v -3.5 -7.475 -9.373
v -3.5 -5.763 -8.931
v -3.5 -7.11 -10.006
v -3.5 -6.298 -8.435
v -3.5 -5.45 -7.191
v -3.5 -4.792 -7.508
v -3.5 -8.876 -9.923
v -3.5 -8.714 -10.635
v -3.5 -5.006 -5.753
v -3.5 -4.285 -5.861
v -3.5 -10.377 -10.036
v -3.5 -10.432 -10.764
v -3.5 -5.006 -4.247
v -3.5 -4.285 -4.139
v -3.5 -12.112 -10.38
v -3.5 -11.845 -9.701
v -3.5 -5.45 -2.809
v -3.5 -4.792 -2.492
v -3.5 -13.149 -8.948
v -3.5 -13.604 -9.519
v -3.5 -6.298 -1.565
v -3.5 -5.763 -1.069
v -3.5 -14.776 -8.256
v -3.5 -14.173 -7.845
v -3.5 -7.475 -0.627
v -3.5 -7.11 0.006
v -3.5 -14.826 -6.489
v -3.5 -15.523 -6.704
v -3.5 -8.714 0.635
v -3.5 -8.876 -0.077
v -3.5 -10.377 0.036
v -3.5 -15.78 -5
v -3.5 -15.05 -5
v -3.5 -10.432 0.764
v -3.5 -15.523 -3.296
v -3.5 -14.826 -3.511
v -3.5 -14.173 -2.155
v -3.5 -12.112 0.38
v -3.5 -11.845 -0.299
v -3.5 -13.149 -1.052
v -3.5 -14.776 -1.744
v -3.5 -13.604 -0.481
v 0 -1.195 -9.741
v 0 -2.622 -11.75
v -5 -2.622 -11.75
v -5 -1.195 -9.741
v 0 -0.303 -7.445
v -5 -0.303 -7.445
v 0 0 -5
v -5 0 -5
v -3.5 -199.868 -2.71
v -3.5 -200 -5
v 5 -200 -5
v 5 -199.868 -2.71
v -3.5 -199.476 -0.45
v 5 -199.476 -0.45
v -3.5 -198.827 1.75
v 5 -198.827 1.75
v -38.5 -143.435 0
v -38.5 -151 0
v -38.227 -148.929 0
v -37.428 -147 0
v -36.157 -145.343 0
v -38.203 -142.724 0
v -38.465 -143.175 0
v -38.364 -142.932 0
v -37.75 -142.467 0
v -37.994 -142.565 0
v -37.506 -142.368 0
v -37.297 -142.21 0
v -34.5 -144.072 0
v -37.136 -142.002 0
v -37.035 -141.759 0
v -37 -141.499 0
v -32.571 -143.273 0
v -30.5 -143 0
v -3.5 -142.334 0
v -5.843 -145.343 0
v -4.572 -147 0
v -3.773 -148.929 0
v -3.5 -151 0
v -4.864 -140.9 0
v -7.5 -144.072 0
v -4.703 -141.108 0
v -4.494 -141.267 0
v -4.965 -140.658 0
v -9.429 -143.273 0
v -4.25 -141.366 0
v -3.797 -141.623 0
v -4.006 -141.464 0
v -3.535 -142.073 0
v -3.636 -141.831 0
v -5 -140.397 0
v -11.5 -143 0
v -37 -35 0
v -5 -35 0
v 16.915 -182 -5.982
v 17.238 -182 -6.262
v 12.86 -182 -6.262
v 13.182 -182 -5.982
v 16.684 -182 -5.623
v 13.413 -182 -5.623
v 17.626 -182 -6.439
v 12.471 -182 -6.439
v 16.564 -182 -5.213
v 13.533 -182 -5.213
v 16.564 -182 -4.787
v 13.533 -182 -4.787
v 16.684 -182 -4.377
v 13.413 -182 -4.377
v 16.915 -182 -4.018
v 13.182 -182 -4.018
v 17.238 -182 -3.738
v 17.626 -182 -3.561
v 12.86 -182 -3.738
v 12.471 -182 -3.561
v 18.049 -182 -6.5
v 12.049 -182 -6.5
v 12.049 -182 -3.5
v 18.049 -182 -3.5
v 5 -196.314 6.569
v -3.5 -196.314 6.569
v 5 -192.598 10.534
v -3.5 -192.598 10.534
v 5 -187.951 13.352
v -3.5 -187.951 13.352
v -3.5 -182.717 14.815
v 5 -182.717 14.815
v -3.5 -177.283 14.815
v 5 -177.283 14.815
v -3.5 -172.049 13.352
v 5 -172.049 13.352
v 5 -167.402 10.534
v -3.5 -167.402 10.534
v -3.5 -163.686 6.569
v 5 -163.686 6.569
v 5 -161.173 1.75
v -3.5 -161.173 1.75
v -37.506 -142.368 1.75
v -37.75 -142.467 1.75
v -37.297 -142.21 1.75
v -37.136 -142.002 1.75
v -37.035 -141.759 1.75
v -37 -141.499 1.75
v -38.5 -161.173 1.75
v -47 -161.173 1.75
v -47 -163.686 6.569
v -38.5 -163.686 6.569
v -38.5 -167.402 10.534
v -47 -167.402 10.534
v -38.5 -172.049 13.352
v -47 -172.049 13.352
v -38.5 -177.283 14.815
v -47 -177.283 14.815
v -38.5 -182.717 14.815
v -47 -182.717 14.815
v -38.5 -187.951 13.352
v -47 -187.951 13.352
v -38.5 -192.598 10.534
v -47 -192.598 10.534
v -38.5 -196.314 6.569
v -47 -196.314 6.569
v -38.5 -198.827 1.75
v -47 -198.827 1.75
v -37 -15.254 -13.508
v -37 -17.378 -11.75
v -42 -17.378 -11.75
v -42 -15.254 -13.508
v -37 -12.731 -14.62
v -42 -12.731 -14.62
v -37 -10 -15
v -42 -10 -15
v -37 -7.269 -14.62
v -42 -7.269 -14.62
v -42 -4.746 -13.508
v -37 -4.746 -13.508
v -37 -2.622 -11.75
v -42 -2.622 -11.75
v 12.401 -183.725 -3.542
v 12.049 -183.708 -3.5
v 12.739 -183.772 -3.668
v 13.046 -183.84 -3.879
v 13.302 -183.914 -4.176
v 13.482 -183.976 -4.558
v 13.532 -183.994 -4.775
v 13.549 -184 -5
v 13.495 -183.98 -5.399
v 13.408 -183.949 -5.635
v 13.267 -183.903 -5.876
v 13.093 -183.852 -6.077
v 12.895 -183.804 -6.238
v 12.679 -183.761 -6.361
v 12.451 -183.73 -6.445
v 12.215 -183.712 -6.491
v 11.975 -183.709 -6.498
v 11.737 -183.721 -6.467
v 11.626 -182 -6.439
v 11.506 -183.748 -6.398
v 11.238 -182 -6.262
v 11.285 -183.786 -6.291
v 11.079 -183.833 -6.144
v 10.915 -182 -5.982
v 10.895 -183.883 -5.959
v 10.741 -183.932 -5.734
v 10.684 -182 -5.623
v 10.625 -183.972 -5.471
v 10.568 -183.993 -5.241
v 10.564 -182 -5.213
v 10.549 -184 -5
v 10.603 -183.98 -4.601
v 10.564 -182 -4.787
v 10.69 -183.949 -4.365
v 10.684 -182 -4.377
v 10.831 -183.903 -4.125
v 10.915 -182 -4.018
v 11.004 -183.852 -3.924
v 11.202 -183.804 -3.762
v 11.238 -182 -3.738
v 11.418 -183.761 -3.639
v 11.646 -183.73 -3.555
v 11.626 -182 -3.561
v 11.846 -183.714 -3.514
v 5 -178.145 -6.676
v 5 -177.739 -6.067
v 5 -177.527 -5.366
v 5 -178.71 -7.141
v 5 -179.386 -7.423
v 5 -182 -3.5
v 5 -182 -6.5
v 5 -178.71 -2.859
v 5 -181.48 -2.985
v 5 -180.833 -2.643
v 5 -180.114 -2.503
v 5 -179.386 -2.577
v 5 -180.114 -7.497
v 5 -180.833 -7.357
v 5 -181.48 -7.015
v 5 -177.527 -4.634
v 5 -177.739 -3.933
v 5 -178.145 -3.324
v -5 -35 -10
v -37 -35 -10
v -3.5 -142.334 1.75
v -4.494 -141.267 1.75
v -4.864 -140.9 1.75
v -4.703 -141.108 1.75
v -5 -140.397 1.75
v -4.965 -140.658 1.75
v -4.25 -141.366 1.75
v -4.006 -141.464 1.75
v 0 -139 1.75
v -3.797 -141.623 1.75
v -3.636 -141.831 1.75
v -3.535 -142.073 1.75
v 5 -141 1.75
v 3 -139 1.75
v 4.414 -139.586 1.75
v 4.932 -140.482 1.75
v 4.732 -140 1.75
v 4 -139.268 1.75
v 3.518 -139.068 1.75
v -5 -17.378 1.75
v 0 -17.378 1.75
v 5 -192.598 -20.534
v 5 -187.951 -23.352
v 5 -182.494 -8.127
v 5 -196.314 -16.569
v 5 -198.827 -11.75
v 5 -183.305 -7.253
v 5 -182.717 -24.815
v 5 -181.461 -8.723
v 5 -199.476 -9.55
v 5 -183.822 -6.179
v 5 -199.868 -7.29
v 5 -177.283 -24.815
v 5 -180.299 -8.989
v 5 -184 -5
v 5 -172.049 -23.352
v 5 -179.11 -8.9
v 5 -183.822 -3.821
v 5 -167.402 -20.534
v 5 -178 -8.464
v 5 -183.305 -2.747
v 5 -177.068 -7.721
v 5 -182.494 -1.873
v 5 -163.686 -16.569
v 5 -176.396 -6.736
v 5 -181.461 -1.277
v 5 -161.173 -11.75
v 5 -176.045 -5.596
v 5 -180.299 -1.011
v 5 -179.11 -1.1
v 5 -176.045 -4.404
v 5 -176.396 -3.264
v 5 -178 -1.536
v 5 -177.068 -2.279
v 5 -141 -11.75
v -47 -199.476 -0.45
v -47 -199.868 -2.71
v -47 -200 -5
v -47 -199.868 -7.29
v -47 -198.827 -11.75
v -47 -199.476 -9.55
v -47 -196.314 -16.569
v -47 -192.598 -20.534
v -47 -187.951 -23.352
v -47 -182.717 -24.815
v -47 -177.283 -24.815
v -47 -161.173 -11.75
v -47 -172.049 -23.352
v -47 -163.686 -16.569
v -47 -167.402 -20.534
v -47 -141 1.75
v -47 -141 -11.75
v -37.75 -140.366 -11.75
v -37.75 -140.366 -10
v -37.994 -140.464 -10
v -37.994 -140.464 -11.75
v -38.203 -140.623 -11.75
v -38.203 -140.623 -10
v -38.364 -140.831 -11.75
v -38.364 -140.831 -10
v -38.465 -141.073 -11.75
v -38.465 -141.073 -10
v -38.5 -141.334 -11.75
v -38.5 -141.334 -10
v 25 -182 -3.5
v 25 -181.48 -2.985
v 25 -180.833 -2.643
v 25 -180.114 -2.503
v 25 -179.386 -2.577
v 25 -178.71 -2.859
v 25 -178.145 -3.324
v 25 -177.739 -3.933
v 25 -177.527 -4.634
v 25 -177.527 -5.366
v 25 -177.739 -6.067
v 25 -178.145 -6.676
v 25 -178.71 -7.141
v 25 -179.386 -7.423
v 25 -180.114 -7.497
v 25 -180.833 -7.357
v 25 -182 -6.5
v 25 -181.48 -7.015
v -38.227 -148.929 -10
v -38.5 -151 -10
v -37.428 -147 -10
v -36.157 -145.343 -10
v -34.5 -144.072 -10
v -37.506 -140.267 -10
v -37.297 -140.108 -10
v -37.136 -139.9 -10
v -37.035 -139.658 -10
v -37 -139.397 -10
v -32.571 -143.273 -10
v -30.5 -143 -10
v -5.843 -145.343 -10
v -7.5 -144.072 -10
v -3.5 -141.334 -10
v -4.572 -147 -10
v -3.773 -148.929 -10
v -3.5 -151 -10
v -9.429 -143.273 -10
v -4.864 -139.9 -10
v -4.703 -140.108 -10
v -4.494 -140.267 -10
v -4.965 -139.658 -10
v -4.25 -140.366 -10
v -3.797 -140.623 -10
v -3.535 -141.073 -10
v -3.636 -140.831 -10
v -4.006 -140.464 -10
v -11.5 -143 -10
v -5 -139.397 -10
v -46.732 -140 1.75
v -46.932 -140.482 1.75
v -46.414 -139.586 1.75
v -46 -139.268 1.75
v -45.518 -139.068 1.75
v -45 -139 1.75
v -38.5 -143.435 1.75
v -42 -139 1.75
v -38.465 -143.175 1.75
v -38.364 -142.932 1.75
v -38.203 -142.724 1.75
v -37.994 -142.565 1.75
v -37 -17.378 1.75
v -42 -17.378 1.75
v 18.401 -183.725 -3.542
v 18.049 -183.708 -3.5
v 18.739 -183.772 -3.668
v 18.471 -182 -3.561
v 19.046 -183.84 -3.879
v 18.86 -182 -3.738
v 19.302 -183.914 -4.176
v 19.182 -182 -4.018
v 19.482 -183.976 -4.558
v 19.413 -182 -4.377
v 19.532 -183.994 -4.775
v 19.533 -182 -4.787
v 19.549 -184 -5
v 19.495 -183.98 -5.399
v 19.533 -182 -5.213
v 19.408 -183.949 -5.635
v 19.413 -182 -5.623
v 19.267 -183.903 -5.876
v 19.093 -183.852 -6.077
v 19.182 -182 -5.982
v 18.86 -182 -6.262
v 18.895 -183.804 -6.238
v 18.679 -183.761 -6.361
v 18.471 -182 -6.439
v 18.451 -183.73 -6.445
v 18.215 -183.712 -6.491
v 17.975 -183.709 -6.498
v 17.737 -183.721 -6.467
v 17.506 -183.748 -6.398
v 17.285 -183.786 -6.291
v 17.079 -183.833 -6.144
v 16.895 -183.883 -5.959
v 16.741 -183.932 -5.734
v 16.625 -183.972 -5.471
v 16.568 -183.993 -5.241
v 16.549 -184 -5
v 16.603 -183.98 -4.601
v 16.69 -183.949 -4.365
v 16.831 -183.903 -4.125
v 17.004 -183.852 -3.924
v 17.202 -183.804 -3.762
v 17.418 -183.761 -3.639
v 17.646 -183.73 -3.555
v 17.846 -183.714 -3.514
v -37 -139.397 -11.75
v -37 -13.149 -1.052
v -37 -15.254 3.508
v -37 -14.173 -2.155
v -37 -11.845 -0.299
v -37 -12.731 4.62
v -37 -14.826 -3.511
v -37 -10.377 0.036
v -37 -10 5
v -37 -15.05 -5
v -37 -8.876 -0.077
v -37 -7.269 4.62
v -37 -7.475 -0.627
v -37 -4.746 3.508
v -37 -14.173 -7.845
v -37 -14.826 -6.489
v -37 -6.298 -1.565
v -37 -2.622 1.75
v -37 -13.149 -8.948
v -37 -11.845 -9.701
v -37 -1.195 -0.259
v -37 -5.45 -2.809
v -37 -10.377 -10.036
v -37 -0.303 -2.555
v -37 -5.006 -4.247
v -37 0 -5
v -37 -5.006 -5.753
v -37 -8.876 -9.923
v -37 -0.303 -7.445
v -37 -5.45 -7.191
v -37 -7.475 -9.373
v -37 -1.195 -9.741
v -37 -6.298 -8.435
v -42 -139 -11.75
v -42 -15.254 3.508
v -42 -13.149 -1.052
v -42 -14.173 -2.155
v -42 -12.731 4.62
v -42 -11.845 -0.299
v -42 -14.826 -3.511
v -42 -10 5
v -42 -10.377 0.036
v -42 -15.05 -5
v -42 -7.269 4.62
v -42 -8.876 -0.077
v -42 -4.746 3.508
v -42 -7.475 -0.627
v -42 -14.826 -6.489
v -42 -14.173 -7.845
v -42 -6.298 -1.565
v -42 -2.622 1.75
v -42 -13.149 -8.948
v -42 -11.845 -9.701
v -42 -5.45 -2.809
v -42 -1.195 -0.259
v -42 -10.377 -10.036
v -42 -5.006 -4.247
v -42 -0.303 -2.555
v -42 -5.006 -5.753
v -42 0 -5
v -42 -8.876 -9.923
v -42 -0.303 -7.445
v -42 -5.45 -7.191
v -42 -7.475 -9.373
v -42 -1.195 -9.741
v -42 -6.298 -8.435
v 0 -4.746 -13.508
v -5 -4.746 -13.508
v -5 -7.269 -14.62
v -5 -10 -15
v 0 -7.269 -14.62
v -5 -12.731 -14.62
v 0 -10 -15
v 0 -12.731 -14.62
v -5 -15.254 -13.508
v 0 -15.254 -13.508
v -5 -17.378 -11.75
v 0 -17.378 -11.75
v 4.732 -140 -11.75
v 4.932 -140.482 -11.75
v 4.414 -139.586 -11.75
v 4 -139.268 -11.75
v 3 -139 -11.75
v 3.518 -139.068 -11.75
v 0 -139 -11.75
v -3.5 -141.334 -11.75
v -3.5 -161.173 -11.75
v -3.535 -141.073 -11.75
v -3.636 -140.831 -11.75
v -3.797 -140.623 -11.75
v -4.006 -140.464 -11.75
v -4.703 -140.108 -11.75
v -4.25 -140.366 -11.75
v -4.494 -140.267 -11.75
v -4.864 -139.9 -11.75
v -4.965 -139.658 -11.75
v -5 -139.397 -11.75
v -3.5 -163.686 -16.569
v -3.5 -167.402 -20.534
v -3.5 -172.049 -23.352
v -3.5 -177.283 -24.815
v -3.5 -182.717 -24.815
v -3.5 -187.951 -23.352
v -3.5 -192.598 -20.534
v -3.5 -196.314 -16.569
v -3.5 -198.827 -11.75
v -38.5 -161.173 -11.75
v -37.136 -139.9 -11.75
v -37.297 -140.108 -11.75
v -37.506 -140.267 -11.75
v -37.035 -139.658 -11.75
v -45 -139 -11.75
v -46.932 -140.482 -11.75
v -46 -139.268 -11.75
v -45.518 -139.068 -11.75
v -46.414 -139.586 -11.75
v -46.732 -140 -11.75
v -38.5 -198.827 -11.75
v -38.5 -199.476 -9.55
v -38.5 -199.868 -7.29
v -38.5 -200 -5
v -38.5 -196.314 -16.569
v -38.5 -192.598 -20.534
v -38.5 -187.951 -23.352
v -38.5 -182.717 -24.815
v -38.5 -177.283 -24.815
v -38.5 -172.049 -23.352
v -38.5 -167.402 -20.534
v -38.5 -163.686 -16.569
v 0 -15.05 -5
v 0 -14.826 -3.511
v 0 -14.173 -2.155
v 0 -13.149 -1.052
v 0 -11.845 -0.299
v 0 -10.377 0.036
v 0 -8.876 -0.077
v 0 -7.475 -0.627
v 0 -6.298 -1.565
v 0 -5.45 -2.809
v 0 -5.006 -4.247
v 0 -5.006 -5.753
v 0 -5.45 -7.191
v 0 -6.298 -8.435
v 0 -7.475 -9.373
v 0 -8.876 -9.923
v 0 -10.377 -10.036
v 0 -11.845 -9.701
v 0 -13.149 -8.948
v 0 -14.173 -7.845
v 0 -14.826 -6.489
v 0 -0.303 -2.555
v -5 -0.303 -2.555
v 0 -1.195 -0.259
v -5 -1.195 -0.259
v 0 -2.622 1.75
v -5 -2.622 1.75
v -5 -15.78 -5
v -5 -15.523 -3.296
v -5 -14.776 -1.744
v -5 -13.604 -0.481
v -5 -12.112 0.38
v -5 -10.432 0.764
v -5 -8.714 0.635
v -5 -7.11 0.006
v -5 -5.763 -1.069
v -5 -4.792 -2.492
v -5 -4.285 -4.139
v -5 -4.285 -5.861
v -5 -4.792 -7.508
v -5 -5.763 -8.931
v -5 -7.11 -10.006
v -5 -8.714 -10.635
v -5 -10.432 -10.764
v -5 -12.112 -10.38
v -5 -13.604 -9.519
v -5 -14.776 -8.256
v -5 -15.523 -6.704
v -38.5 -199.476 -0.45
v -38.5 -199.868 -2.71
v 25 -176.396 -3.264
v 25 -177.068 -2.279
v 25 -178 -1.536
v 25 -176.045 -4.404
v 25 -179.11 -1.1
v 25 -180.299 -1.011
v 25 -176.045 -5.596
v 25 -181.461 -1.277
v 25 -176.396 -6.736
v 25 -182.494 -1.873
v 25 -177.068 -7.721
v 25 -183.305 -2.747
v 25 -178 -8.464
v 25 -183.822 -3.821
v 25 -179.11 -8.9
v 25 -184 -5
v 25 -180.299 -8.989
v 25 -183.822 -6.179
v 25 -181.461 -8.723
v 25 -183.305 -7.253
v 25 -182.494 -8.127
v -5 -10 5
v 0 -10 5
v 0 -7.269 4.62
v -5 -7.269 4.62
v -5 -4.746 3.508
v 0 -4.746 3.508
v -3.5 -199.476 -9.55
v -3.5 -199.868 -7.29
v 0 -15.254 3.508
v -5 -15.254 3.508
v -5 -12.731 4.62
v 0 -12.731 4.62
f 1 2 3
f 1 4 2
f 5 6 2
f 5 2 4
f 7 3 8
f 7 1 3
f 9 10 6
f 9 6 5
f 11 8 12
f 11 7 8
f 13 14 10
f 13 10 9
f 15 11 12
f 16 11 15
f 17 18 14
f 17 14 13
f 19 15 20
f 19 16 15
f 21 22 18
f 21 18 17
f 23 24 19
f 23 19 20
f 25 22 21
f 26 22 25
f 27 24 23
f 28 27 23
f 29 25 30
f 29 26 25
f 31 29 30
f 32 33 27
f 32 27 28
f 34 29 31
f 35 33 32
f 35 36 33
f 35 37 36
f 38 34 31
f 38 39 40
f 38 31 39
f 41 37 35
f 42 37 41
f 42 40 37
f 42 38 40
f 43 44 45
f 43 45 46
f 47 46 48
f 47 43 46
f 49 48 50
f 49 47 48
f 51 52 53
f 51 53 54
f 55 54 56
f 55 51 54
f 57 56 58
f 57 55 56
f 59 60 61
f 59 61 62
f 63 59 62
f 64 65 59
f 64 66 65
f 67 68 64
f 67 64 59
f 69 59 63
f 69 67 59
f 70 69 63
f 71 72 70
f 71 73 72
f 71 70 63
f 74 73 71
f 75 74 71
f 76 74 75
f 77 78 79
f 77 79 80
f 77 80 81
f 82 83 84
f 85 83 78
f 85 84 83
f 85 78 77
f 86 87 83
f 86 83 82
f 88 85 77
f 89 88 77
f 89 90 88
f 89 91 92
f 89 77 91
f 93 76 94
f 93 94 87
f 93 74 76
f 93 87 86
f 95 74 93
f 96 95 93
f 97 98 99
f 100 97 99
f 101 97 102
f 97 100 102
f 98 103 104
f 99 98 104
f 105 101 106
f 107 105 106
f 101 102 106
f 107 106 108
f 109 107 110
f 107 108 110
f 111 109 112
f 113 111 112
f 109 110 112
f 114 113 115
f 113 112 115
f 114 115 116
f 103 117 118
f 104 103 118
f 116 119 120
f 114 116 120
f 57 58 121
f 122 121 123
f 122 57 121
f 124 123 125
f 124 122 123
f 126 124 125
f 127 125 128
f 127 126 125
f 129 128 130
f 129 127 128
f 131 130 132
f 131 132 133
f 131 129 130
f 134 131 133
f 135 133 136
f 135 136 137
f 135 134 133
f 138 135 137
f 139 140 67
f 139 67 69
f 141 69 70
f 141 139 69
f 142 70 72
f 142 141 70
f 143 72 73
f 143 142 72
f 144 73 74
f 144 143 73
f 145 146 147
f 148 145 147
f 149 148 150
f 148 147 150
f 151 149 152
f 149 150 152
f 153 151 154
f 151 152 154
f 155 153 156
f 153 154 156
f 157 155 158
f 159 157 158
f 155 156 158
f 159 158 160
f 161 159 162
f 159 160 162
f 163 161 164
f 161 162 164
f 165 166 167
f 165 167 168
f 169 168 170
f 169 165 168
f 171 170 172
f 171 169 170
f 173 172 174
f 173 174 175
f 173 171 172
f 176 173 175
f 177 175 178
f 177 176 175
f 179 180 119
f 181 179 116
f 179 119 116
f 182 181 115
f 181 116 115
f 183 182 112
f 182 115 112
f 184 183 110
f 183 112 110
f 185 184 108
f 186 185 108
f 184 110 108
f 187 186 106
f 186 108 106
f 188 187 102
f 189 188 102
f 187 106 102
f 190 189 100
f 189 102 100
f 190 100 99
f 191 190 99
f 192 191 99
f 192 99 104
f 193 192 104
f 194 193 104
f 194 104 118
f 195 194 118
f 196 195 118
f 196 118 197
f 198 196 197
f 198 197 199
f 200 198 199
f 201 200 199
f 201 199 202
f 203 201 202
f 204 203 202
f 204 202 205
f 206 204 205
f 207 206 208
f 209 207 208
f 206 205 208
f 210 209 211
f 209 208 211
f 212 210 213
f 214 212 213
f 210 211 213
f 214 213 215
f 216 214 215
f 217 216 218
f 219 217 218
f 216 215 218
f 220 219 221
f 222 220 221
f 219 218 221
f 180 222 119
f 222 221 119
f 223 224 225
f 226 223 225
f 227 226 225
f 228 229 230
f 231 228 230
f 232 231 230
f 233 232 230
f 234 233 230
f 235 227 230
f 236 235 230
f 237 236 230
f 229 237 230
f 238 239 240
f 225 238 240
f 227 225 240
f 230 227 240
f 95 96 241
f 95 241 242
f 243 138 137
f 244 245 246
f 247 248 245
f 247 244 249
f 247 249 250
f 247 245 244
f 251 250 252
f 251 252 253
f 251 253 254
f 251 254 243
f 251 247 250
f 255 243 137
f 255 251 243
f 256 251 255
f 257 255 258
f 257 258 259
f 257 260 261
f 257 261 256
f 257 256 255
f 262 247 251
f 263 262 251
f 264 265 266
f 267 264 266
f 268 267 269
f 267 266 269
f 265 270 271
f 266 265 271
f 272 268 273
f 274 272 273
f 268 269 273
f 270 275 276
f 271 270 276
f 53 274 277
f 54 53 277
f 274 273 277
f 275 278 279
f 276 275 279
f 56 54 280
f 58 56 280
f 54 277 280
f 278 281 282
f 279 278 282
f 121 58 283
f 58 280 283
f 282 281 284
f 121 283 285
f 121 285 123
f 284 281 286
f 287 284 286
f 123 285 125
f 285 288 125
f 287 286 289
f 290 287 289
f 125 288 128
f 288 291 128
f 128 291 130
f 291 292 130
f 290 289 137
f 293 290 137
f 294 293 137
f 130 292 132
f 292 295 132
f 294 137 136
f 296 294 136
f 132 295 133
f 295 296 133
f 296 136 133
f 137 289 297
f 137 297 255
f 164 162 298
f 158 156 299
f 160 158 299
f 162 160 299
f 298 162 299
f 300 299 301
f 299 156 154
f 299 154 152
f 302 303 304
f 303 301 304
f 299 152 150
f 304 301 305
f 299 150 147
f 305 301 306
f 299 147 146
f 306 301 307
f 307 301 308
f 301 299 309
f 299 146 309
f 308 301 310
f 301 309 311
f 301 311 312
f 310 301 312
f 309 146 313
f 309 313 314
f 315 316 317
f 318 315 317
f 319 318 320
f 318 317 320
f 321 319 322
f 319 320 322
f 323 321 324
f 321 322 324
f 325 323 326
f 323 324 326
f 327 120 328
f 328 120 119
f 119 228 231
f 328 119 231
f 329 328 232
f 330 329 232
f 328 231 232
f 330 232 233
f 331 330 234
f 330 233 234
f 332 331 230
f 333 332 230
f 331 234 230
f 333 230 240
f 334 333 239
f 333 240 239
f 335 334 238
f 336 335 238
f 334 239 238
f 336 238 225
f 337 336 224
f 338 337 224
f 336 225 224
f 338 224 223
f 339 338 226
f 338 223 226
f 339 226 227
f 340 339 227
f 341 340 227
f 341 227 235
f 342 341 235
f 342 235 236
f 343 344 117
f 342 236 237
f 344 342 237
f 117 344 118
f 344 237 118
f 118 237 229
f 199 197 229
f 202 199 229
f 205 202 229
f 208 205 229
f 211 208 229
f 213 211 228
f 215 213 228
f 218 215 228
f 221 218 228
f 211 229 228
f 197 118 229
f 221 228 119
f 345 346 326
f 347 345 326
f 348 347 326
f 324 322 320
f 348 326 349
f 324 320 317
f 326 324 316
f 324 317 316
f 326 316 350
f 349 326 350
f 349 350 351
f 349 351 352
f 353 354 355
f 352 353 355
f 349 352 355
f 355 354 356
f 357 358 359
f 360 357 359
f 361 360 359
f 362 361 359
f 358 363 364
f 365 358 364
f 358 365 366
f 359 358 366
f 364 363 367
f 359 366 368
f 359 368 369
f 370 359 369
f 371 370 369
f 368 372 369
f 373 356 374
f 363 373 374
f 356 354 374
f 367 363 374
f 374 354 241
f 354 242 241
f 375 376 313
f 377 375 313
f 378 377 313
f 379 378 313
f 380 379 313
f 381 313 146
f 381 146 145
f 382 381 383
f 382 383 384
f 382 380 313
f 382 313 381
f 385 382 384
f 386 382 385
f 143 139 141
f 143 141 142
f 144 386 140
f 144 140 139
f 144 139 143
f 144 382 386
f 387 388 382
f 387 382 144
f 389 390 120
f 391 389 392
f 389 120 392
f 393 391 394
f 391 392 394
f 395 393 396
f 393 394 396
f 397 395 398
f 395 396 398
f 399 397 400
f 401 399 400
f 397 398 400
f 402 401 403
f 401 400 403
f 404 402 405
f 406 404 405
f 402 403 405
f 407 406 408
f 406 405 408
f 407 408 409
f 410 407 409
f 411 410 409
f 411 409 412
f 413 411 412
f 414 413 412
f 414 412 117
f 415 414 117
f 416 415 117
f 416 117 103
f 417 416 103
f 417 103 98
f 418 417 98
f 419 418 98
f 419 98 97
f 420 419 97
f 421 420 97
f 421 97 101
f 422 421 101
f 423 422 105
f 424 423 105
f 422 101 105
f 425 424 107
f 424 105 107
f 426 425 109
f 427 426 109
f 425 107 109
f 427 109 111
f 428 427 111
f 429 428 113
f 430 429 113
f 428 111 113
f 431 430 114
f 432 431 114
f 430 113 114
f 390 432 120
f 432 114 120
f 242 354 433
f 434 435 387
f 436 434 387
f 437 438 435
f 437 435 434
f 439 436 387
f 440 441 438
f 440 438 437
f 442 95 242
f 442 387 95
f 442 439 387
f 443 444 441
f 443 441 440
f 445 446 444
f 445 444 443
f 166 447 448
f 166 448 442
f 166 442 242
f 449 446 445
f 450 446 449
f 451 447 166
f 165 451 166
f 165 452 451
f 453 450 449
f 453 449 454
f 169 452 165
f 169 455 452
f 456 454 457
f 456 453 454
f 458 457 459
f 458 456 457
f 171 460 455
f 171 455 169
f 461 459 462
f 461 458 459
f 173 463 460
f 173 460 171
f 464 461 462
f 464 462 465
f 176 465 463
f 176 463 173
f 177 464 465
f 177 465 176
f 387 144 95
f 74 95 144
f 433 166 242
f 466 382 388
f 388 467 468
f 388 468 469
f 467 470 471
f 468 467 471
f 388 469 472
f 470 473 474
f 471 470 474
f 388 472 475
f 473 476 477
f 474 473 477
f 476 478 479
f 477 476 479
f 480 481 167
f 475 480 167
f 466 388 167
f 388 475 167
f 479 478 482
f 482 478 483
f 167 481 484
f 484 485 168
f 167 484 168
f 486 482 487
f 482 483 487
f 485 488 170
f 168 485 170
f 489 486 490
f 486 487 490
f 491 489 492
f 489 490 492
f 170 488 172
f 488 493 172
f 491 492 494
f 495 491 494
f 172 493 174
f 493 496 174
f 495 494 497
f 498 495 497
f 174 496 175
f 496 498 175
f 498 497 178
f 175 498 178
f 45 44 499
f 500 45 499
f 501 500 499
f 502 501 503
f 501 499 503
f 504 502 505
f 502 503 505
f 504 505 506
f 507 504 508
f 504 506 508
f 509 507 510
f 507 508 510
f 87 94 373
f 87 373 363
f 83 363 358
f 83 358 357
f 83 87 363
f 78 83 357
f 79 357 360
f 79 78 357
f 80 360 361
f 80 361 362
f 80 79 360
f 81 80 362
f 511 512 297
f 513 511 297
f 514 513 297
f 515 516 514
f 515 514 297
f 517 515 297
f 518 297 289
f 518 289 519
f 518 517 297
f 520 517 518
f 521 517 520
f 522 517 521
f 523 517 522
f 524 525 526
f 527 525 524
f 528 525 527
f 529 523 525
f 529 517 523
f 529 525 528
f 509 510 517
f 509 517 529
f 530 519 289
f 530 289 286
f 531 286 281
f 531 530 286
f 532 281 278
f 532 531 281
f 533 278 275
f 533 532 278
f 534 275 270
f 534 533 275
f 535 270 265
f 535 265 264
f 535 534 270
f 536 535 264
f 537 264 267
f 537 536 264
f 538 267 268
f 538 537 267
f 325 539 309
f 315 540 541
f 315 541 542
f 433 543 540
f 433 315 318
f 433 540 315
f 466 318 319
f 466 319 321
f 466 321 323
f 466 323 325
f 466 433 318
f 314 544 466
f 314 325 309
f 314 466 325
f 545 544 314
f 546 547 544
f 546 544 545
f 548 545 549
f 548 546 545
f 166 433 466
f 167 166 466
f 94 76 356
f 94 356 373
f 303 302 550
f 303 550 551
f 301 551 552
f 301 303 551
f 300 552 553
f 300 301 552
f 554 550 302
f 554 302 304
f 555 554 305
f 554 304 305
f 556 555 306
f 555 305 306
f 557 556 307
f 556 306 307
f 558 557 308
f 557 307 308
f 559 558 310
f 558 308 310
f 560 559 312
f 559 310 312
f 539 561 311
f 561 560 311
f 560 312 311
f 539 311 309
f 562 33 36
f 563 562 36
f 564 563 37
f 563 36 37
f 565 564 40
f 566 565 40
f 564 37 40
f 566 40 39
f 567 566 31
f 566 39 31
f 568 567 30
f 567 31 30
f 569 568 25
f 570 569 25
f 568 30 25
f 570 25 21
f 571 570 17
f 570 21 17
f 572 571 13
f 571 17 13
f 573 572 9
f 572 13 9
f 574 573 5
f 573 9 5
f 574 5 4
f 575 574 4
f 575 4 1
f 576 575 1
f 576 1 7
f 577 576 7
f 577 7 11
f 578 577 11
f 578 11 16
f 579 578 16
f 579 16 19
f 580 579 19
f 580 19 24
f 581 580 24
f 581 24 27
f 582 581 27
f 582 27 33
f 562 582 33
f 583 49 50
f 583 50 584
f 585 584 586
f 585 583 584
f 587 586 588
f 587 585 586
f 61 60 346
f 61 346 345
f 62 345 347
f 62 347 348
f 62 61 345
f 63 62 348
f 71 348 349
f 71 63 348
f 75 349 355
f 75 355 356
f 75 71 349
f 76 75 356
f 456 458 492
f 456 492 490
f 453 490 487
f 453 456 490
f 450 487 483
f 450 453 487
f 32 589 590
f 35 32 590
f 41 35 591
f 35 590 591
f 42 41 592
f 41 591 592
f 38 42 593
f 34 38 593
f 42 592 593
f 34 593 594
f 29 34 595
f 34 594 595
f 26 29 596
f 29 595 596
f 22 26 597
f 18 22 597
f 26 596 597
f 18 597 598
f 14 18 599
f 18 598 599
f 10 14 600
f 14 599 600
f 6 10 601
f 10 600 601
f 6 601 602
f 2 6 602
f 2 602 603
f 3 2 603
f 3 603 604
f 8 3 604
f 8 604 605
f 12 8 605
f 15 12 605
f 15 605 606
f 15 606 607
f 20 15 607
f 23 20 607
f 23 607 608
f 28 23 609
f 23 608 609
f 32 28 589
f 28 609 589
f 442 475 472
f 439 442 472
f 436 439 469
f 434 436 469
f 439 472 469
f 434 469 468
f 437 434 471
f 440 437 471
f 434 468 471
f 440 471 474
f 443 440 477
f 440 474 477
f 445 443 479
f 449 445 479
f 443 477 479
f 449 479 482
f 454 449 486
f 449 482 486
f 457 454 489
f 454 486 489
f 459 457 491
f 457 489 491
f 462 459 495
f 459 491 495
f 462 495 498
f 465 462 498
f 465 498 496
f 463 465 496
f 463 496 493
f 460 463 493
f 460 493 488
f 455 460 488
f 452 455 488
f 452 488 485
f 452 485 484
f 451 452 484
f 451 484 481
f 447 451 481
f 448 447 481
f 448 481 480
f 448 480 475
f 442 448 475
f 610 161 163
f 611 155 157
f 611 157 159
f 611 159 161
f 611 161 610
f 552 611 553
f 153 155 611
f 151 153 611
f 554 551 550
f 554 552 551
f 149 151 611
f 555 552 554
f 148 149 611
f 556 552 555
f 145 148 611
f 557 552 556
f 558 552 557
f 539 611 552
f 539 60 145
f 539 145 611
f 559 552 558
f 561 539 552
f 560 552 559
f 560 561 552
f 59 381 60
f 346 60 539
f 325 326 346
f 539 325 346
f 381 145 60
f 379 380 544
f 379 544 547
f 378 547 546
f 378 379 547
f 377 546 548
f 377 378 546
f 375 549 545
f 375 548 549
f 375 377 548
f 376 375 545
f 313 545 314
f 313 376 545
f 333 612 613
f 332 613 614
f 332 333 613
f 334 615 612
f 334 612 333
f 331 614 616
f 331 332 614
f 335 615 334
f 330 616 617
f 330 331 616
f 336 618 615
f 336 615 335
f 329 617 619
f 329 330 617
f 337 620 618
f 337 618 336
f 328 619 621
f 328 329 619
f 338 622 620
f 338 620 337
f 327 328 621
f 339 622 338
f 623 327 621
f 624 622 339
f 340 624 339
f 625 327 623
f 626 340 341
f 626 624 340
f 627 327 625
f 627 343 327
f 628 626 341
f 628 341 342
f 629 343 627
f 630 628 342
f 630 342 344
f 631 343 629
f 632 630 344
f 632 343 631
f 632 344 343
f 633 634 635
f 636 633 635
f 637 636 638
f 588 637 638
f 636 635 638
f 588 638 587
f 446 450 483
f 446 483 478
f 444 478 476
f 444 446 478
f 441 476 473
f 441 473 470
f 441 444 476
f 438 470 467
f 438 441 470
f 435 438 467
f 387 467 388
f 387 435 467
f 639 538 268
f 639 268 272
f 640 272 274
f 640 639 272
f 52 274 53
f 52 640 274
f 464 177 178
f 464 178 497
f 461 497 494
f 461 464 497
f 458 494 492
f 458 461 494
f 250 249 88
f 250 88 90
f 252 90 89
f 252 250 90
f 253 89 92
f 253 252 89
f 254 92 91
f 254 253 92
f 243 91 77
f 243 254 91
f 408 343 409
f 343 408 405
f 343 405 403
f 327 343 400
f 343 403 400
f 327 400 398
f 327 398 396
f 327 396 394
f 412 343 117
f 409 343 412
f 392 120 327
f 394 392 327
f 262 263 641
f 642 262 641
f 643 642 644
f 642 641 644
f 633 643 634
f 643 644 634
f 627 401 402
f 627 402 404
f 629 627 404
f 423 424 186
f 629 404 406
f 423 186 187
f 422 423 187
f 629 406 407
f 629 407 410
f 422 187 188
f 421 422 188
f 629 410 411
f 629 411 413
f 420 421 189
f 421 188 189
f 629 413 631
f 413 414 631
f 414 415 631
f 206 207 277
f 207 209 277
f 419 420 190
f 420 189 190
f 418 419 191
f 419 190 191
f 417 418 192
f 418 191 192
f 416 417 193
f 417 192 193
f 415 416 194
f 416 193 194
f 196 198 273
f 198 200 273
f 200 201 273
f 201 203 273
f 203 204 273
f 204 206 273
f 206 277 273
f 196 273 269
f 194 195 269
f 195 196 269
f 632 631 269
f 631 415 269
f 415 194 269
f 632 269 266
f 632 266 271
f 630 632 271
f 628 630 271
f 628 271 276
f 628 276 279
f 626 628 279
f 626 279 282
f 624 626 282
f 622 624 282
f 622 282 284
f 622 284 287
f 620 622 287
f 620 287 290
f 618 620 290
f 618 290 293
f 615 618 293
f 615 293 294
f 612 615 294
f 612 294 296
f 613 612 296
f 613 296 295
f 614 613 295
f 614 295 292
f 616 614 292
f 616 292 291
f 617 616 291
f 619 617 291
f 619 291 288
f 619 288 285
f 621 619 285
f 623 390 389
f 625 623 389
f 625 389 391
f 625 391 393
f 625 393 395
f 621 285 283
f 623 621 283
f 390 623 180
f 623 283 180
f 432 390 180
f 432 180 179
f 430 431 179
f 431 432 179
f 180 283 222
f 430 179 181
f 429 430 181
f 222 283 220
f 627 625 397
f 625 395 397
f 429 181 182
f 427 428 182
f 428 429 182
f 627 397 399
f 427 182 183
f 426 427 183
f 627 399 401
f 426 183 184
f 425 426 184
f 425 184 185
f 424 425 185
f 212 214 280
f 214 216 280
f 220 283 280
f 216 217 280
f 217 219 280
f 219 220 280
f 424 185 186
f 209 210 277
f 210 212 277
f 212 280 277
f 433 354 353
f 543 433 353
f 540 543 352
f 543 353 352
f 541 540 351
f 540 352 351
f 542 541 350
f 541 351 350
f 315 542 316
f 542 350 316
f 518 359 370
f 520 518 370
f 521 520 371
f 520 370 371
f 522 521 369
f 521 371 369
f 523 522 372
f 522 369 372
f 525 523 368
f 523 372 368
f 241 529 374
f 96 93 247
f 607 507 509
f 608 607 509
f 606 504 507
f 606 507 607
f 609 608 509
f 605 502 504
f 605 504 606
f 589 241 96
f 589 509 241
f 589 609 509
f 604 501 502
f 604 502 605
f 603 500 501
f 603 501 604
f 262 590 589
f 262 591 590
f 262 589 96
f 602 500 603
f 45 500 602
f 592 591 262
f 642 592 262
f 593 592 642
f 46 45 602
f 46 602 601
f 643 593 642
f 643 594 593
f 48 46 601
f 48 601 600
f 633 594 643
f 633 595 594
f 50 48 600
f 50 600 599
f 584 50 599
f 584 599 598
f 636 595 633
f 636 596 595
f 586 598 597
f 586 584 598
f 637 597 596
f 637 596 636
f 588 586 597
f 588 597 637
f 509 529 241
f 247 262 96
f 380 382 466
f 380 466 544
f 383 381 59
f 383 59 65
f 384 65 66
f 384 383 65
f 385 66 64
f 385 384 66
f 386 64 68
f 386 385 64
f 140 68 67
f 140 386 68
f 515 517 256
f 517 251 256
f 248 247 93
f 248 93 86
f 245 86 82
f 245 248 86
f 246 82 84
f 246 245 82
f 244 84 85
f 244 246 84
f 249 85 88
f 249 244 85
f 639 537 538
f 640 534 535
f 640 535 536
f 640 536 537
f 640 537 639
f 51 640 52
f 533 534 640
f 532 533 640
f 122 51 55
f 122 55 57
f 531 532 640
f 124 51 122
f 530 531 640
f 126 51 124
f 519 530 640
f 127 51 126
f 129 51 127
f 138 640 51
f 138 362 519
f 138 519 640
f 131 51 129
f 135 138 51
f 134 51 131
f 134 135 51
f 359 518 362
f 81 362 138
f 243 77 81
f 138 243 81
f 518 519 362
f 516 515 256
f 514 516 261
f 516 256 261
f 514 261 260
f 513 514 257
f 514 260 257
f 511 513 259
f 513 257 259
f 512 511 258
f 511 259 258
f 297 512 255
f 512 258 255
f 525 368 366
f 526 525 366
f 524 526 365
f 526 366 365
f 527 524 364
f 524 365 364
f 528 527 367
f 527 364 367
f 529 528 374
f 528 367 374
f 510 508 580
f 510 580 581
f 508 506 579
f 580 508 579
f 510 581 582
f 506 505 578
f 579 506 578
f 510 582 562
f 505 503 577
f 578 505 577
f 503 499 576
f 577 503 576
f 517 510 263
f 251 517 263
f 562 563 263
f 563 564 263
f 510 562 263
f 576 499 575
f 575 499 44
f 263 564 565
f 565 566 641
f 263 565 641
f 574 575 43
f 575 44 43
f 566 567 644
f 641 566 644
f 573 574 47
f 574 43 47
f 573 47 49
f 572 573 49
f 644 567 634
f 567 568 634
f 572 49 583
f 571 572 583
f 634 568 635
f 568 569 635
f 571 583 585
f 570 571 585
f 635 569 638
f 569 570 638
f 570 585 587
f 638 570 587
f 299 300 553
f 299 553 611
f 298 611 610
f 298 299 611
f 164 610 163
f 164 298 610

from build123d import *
from build123d.topology import SkipClean

# Parameters (mm, degrees)
SALIENTE_EXTRUIR1_DEPTH    = 10
SALIENTE_EXTRUIR2_DEPTH    = 10
SALIENTE_EXTRUIR3_DEPTH    = 10
SALIENTE_EXTRUIR4_DEPTH    = 1.75
SALIENTE_EXTRUIR5_START    = 1.75
SALIENTE_EXTRUIR5_DEPTH    = 1.75
CROQUIS26_W                = 5
CROQUIS26_H                = 35
SALIENTE_EXTRUIR6_DEPTH    = 1.75
CROQUIS27_W                = 5
CROQUIS27_H                = 35
SALIENTE_EXTRUIR7_DEPTH    = 11.75
CORTAR_EXTRUIR3_DEPTH      = 205.699932829
CORTAR_EXTRUIR3_DEPTH_BACK = 99.75
SALIENTE_EXTRUIR8_START    = -5
SALIENTE_EXTRUIR8_DEPTH    = 5
CROQUIS29_R                = 10
SALIENTE_EXTRUIR9_DEPTH    = 5
CORTAR_EXTRUIR5_DEPTH      = 206.22487666
CORTAR_EXTRUIR5_DEPTH_BACK = 206.22487666
SALIENTE_EXTRUIR11_START   = -8.5
CROQUIS32_R                = 20
SALIENTE_EXTRUIR11_DEPTH   = 8.5
CROQUIS33_R                = 20
SALIENTE_EXTRUIR12_DEPTH   = 8.5
CROQUIS34_R                = 5.05
CORTAR_EXTRUIR6_DEPTH      = 90
CROQUIS39_R                = 5.78
CORTAR_EXTRUIR7_DEPTH      = 1.5
CROQUIS40_R                = 4
SALIENTE_EXTRUIR13_DEPTH   = 20
CROQUIS41_R                = 1.5
CORTAR_EXTRUIR8_DEPTH      = 20


with BuildPart() as part:
    # Croquis1 → Saliente-Extruir1 (new body)
    with BuildSketch(Plane.XY):
        Polygon((0, -143), (0, -35), (-1.6, -35), (-37.4, -35), (-42, -35), (-42, -143), align=None)
    extrude(amount=-SALIENTE_EXTRUIR1_DEPTH)

    # Croquis3 → Saliente-Extruir2 (add)
    with BuildSketch(Plane.XY):
        with BuildLine():
            Line((-47, -141), (-47, -145))
            Line((-47, -145), (-47, -160))
            Line((-47, -160), (-47, -180))
            Line((-47, -180), (-47, -200))
            Line((-47, -200), (-38.5, -200))
            Line((-38.5, -200), (-38.5, -151))
            Line((-38.5, -151), (-38.5, -143))
            Line((-38.5, -143), (-42, -143))
            Line((-42, -143), (-42, -139))
            Line((-42, -139), (-45, -139))
            ThreePointArc((-45, -139), (-46.414213562, -139.585786438), (-47, -141))
        make_face()
        with BuildLine():
            Line((0, -143), (-11.5, -143))
            ThreePointArc((-11.5, -143), (-5.843145751, -145.343145751), (-3.5, -151))
            Line((-3.5, -151), (-3.5, -200))
            Line((-3.5, -200), (5, -200))
            Line((5, -200), (5, -143))
            Line((5, -143), (5, -141))
            ThreePointArc((5, -141), (4.414213562, -139.585786438), (3, -139))
            Line((3, -139), (0, -139))
            Line((0, -139), (0, -143))
        make_face()
    extrude(amount=-SALIENTE_EXTRUIR2_DEPTH)

    # Croquis21 → Saliente-Extruir3 (add)
    with BuildSketch(Plane.XY):
        with BuildLine():
            Line((-38.5, -143), (-38.5, -151))
            ThreePointArc((-38.5, -151), (-36.156854249, -145.343145751), (-30.5, -143))
            Line((-30.5, -143), (-38.5, -143))
        make_face()
    extrude(amount=-SALIENTE_EXTRUIR3_DEPTH)

    # Croquis22 → Saliente-Extruir4 (add)
    with BuildSketch(Plane(origin=(0, 0, -10), x_dir=(-1, 0, 0), z_dir=(0, 0, -1))):
        with BuildLine():
            Line((3.5, -200), (3.5, -156.87358131))
            Line((3.5, -156.87358131), (3.5, -151))
            Line((3.5, -151), (3.5, -141.333778868))
            ThreePointArc((3.5, -141.333778868), (3.709430585, -140.721406432), (4.25, -140.365533031))
            ThreePointArc((4.25, -140.365533031), (4.790569415, -140.00965963), (5, -139.397287194))
            Line((5, -139.397287194), (5, -35))
            Line((5, -35), (0, -35))
            Line((0, -35), (0, -139))
            Line((0, -139), (-3, -139))
            ThreePointArc((-3, -139), (-4.414213562, -139.585786438), (-5, -141))
            Line((-5, -141), (-5, -200))
            Line((-5, -200), (3.5, -200))
        make_face()
        with BuildLine():
            Line((42, -35), (37, -35))
            Line((37, -35), (37, -139.397287194))
            ThreePointArc((37, -139.397287194), (37.209430585, -140.00965963), (37.75, -140.365533031))
            ThreePointArc((37.75, -140.365533031), (38.290569415, -140.721406432), (38.5, -141.333778868))
            Line((38.5, -141.333778868), (38.5, -151))
            Line((38.5, -151), (38.5, -155.512462497))
            Line((38.5, -155.512462497), (38.5, -200))
            Line((38.5, -200), (47, -200))
            Line((47, -200), (47, -141))
            ThreePointArc((47, -141), (46.414213562, -139.585786438), (45, -139))
            Line((45, -139), (42, -139))
            Line((42, -139), (42, -35))
        make_face()
    extrude(amount=SALIENTE_EXTRUIR4_DEPTH)

    # Croquis24 → Saliente-Extruir5 (add)
    with BuildSketch(Plane.XY.offset(SALIENTE_EXTRUIR5_START)):
        with BuildLine():
            Line((-37, -141.498649254), (-37, -35))
            Line((-37, -35), (-42, -35))
            Line((-42, -35), (-42, -139))
            Line((-42, -139), (-45, -139))
            ThreePointArc((-45, -139), (-46.414213562, -139.585786438), (-47, -141))
            Line((-47, -141), (-47, -200))
            Line((-47, -200), (-38.5, -200))
            Line((-38.5, -200), (-38.5, -143.435140927))
            ThreePointArc((-38.5, -143.435140927), (-38.290569415, -142.822768491), (-37.75, -142.466895091))
            ThreePointArc((-37.75, -142.466895091), (-37.209430585, -142.11102169), (-37, -141.498649254))
        make_face()
        with BuildLine():
            Line((0, -35), (-5, -35))
            Line((-5, -35), (-5, -140.397287194))
            ThreePointArc((-5, -140.397287194), (-4.790569415, -141.00965963), (-4.25, -141.365533031))
            ThreePointArc((-4.25, -141.365533031), (-3.709430585, -141.721406432), (-3.5, -142.333778868))
            Line((-3.5, -142.333778868), (-3.5, -200))
            Line((-3.5, -200), (5, -200))
            Line((5, -200), (5, -141))
            ThreePointArc((5, -141), (4.414213562, -139.585786438), (3, -139))
            Line((3, -139), (0, -139))
            Line((0, -139), (0, -35))
        make_face()
    extrude(amount=-SALIENTE_EXTRUIR5_DEPTH)

    # Croquis26 → Saliente-Extruir6 (add)
    with BuildSketch(Plane.XY):
        with Locations((-39.5, -17.5)):
            Rectangle(CROQUIS26_W, CROQUIS26_H)
        with Locations((-2.5, -17.5)):
            Rectangle(CROQUIS26_W, CROQUIS26_H)
    extrude(amount=SALIENTE_EXTRUIR6_DEPTH)

    # Croquis27 → Saliente-Extruir7 (add)
    with BuildSketch(Plane(origin=(0, 0, 0), x_dir=(-1, 0, 0), z_dir=(0, 0, -1))):
        with Locations((2.5, -17.5)):
            Rectangle(CROQUIS27_W, CROQUIS27_H)
        with Locations((39.5, -17.5)):
            Rectangle(CROQUIS27_W, CROQUIS27_H)
    extrude(amount=SALIENTE_EXTRUIR7_DEPTH)

    # Croquis28 → Cortar-Extruir3 (cut, two sides: drawn at the far end of the back side and taken through both)
    with BuildSketch(Plane.ZY.offset(5).offset(-CORTAR_EXTRUIR3_DEPTH_BACK)):
        with BuildLine():
            ThreePointArc((-11.75, -2.621822718), (-8.62065099, -0.678471884), (-5, 0))
            Line((-5, 0), (-11.75, 0))
            Line((-11.75, 0), (-11.75, -2.621822718))
        make_face()
        with BuildLine():
            Line((1.75, -2.621822718), (1.75, 0))
            Line((1.75, 0), (-5, 0))
            ThreePointArc((-5, 0), (-1.37934901, -0.678471884), (1.75, -2.621822718))
        make_face()
    extrude(amount=CORTAR_EXTRUIR3_DEPTH + CORTAR_EXTRUIR3_DEPTH_BACK, mode=Mode.SUBTRACT)

    # Croquis28<5> → Saliente-Extruir8 (add)
    with BuildSketch(Plane.ZY.offset(5).offset(SALIENTE_EXTRUIR8_START)):
        with BuildLine():
            Line((-11.75, -17.378177282), (-11.75, -2.621822718))
            ThreePointArc((-11.75, -2.621822718), (-15, -10), (-11.75, -17.378177282))
        make_face()
        with BuildLine():
            ThreePointArc((5, -10), (4.151502609, -5.968871126), (1.75, -2.621822718))
            Line((1.75, -2.621822718), (1.75, -17.378177282))
            ThreePointArc((1.75, -17.378177282), (4.151502609, -14.031128874), (5, -10))
        make_face()
    extrude(amount=SALIENTE_EXTRUIR8_DEPTH)

    # Croquis29 → Saliente-Extruir9 (add)
    with BuildSketch(Plane(origin=(-37, 0, 0), x_dir=(0, 0, -1), z_dir=(1, 0, 0))):
        with Locations((5, -10)):
            Circle(CROQUIS29_R)
    extrude(amount=-SALIENTE_EXTRUIR9_DEPTH)

    # Croquis31 → Cortar-Extruir5 (cut, two sides: drawn at the far end of the back side and taken through both)
    with BuildSketch(Plane(origin=(-38.5, 0, 0), x_dir=(0, 0, -1), z_dir=(1, 0, 0)).offset(-CORTAR_EXTRUIR5_DEPTH_BACK)):
        with BuildLine():
            Line((-1.75, -200), (5, -200))
            ThreePointArc((5, -200), (1.574376792, -199.704443804), (-1.75, -198.826510564))
            Line((-1.75, -198.826510564), (-1.75, -200))
        make_face()
        with BuildLine():
            Line((11.75, -200), (11.75, -198.826510564))
            ThreePointArc((11.75, -198.826510564), (8.425623208, -199.704443804), (5, -200))
            Line((5, -200), (11.75, -200))
        make_face()
    extrude(amount=CORTAR_EXTRUIR5_DEPTH + CORTAR_EXTRUIR5_DEPTH_BACK, mode=Mode.SUBTRACT)

    # Croquis32 → Saliente-Extruir11 (add)
    with BuildSketch(Plane(origin=(-38.5, 0, 0), x_dir=(0, 0, -1), z_dir=(1, 0, 0)).offset(SALIENTE_EXTRUIR11_START)):
        with Locations((5, -180)):
            Circle(CROQUIS32_R)
    extrude(amount=SALIENTE_EXTRUIR11_DEPTH)

    # Croquis33 → Saliente-Extruir12 (add)
    with BuildSketch(Plane.ZY.offset(3.5)):
        with Locations((-5, -180)):
            Circle(CROQUIS33_R)
    extrude(amount=-SALIENTE_EXTRUIR12_DEPTH)

    # Croquis34 → Cortar-Extruir6 (cut)
    with BuildSketch(Plane.ZY.offset(42)):
        with Locations(Location((-5, -10, 0), (0, 0, 270))):
            Circle(CROQUIS34_R)
    extrude(amount=-CORTAR_EXTRUIR6_DEPTH, mode=Mode.SUBTRACT)

    # Croquis39 → Cortar-Extruir7 (cut)
    with SkipClean():  # the faces are left unmerged after this step: merging them gives an invalid solid
        with BuildSketch(Plane.ZY.offset(5)):
            with Locations(Location((-5, -10, 0), (0, 0, 270))):
                Circle(CROQUIS39_R)
        extrude(amount=-CORTAR_EXTRUIR7_DEPTH, mode=Mode.SUBTRACT)

    # Croquis40 → Saliente-Extruir13 (add)
    with SkipClean():  # the faces are left unmerged after this step: merging them gives an invalid solid
        with BuildSketch(Plane(origin=(5, 0, 0), x_dir=(0, 0, -1), z_dir=(1, 0, 0))):
            with Locations(Location((5, -180, 0), (0, 0, 270))):
                Circle(CROQUIS40_R)
            with BuildLine():
                Line((6.5, -182), (3.5, -182))
                ThreePointArc((3.5, -182), (5, -177.5), (6.5, -182))
            make_face(mode=Mode.SUBTRACT)
        extrude(amount=SALIENTE_EXTRUIR13_DEPTH)

    # Croquis41 → Cortar-Extruir8 (cut)
    with SkipClean():  # the faces are left unmerged after this step: merging them gives an invalid solid
        with BuildSketch(Plane(origin=(0, -182, 0), x_dir=(1, 0, 0), z_dir=(0, 1, 0))):
            with Locations(Location((18.048745385, 5, 0), (0, 0, 270))):
                Circle(CROQUIS41_R)
            with Locations(Location((12.048745385, 5, 0), (0, 0, 270))):
                Circle(CROQUIS41_R)
        extrude(amount=-CORTAR_EXTRUIR8_DEPTH, mode=Mode.SUBTRACT)


solid = part.part
